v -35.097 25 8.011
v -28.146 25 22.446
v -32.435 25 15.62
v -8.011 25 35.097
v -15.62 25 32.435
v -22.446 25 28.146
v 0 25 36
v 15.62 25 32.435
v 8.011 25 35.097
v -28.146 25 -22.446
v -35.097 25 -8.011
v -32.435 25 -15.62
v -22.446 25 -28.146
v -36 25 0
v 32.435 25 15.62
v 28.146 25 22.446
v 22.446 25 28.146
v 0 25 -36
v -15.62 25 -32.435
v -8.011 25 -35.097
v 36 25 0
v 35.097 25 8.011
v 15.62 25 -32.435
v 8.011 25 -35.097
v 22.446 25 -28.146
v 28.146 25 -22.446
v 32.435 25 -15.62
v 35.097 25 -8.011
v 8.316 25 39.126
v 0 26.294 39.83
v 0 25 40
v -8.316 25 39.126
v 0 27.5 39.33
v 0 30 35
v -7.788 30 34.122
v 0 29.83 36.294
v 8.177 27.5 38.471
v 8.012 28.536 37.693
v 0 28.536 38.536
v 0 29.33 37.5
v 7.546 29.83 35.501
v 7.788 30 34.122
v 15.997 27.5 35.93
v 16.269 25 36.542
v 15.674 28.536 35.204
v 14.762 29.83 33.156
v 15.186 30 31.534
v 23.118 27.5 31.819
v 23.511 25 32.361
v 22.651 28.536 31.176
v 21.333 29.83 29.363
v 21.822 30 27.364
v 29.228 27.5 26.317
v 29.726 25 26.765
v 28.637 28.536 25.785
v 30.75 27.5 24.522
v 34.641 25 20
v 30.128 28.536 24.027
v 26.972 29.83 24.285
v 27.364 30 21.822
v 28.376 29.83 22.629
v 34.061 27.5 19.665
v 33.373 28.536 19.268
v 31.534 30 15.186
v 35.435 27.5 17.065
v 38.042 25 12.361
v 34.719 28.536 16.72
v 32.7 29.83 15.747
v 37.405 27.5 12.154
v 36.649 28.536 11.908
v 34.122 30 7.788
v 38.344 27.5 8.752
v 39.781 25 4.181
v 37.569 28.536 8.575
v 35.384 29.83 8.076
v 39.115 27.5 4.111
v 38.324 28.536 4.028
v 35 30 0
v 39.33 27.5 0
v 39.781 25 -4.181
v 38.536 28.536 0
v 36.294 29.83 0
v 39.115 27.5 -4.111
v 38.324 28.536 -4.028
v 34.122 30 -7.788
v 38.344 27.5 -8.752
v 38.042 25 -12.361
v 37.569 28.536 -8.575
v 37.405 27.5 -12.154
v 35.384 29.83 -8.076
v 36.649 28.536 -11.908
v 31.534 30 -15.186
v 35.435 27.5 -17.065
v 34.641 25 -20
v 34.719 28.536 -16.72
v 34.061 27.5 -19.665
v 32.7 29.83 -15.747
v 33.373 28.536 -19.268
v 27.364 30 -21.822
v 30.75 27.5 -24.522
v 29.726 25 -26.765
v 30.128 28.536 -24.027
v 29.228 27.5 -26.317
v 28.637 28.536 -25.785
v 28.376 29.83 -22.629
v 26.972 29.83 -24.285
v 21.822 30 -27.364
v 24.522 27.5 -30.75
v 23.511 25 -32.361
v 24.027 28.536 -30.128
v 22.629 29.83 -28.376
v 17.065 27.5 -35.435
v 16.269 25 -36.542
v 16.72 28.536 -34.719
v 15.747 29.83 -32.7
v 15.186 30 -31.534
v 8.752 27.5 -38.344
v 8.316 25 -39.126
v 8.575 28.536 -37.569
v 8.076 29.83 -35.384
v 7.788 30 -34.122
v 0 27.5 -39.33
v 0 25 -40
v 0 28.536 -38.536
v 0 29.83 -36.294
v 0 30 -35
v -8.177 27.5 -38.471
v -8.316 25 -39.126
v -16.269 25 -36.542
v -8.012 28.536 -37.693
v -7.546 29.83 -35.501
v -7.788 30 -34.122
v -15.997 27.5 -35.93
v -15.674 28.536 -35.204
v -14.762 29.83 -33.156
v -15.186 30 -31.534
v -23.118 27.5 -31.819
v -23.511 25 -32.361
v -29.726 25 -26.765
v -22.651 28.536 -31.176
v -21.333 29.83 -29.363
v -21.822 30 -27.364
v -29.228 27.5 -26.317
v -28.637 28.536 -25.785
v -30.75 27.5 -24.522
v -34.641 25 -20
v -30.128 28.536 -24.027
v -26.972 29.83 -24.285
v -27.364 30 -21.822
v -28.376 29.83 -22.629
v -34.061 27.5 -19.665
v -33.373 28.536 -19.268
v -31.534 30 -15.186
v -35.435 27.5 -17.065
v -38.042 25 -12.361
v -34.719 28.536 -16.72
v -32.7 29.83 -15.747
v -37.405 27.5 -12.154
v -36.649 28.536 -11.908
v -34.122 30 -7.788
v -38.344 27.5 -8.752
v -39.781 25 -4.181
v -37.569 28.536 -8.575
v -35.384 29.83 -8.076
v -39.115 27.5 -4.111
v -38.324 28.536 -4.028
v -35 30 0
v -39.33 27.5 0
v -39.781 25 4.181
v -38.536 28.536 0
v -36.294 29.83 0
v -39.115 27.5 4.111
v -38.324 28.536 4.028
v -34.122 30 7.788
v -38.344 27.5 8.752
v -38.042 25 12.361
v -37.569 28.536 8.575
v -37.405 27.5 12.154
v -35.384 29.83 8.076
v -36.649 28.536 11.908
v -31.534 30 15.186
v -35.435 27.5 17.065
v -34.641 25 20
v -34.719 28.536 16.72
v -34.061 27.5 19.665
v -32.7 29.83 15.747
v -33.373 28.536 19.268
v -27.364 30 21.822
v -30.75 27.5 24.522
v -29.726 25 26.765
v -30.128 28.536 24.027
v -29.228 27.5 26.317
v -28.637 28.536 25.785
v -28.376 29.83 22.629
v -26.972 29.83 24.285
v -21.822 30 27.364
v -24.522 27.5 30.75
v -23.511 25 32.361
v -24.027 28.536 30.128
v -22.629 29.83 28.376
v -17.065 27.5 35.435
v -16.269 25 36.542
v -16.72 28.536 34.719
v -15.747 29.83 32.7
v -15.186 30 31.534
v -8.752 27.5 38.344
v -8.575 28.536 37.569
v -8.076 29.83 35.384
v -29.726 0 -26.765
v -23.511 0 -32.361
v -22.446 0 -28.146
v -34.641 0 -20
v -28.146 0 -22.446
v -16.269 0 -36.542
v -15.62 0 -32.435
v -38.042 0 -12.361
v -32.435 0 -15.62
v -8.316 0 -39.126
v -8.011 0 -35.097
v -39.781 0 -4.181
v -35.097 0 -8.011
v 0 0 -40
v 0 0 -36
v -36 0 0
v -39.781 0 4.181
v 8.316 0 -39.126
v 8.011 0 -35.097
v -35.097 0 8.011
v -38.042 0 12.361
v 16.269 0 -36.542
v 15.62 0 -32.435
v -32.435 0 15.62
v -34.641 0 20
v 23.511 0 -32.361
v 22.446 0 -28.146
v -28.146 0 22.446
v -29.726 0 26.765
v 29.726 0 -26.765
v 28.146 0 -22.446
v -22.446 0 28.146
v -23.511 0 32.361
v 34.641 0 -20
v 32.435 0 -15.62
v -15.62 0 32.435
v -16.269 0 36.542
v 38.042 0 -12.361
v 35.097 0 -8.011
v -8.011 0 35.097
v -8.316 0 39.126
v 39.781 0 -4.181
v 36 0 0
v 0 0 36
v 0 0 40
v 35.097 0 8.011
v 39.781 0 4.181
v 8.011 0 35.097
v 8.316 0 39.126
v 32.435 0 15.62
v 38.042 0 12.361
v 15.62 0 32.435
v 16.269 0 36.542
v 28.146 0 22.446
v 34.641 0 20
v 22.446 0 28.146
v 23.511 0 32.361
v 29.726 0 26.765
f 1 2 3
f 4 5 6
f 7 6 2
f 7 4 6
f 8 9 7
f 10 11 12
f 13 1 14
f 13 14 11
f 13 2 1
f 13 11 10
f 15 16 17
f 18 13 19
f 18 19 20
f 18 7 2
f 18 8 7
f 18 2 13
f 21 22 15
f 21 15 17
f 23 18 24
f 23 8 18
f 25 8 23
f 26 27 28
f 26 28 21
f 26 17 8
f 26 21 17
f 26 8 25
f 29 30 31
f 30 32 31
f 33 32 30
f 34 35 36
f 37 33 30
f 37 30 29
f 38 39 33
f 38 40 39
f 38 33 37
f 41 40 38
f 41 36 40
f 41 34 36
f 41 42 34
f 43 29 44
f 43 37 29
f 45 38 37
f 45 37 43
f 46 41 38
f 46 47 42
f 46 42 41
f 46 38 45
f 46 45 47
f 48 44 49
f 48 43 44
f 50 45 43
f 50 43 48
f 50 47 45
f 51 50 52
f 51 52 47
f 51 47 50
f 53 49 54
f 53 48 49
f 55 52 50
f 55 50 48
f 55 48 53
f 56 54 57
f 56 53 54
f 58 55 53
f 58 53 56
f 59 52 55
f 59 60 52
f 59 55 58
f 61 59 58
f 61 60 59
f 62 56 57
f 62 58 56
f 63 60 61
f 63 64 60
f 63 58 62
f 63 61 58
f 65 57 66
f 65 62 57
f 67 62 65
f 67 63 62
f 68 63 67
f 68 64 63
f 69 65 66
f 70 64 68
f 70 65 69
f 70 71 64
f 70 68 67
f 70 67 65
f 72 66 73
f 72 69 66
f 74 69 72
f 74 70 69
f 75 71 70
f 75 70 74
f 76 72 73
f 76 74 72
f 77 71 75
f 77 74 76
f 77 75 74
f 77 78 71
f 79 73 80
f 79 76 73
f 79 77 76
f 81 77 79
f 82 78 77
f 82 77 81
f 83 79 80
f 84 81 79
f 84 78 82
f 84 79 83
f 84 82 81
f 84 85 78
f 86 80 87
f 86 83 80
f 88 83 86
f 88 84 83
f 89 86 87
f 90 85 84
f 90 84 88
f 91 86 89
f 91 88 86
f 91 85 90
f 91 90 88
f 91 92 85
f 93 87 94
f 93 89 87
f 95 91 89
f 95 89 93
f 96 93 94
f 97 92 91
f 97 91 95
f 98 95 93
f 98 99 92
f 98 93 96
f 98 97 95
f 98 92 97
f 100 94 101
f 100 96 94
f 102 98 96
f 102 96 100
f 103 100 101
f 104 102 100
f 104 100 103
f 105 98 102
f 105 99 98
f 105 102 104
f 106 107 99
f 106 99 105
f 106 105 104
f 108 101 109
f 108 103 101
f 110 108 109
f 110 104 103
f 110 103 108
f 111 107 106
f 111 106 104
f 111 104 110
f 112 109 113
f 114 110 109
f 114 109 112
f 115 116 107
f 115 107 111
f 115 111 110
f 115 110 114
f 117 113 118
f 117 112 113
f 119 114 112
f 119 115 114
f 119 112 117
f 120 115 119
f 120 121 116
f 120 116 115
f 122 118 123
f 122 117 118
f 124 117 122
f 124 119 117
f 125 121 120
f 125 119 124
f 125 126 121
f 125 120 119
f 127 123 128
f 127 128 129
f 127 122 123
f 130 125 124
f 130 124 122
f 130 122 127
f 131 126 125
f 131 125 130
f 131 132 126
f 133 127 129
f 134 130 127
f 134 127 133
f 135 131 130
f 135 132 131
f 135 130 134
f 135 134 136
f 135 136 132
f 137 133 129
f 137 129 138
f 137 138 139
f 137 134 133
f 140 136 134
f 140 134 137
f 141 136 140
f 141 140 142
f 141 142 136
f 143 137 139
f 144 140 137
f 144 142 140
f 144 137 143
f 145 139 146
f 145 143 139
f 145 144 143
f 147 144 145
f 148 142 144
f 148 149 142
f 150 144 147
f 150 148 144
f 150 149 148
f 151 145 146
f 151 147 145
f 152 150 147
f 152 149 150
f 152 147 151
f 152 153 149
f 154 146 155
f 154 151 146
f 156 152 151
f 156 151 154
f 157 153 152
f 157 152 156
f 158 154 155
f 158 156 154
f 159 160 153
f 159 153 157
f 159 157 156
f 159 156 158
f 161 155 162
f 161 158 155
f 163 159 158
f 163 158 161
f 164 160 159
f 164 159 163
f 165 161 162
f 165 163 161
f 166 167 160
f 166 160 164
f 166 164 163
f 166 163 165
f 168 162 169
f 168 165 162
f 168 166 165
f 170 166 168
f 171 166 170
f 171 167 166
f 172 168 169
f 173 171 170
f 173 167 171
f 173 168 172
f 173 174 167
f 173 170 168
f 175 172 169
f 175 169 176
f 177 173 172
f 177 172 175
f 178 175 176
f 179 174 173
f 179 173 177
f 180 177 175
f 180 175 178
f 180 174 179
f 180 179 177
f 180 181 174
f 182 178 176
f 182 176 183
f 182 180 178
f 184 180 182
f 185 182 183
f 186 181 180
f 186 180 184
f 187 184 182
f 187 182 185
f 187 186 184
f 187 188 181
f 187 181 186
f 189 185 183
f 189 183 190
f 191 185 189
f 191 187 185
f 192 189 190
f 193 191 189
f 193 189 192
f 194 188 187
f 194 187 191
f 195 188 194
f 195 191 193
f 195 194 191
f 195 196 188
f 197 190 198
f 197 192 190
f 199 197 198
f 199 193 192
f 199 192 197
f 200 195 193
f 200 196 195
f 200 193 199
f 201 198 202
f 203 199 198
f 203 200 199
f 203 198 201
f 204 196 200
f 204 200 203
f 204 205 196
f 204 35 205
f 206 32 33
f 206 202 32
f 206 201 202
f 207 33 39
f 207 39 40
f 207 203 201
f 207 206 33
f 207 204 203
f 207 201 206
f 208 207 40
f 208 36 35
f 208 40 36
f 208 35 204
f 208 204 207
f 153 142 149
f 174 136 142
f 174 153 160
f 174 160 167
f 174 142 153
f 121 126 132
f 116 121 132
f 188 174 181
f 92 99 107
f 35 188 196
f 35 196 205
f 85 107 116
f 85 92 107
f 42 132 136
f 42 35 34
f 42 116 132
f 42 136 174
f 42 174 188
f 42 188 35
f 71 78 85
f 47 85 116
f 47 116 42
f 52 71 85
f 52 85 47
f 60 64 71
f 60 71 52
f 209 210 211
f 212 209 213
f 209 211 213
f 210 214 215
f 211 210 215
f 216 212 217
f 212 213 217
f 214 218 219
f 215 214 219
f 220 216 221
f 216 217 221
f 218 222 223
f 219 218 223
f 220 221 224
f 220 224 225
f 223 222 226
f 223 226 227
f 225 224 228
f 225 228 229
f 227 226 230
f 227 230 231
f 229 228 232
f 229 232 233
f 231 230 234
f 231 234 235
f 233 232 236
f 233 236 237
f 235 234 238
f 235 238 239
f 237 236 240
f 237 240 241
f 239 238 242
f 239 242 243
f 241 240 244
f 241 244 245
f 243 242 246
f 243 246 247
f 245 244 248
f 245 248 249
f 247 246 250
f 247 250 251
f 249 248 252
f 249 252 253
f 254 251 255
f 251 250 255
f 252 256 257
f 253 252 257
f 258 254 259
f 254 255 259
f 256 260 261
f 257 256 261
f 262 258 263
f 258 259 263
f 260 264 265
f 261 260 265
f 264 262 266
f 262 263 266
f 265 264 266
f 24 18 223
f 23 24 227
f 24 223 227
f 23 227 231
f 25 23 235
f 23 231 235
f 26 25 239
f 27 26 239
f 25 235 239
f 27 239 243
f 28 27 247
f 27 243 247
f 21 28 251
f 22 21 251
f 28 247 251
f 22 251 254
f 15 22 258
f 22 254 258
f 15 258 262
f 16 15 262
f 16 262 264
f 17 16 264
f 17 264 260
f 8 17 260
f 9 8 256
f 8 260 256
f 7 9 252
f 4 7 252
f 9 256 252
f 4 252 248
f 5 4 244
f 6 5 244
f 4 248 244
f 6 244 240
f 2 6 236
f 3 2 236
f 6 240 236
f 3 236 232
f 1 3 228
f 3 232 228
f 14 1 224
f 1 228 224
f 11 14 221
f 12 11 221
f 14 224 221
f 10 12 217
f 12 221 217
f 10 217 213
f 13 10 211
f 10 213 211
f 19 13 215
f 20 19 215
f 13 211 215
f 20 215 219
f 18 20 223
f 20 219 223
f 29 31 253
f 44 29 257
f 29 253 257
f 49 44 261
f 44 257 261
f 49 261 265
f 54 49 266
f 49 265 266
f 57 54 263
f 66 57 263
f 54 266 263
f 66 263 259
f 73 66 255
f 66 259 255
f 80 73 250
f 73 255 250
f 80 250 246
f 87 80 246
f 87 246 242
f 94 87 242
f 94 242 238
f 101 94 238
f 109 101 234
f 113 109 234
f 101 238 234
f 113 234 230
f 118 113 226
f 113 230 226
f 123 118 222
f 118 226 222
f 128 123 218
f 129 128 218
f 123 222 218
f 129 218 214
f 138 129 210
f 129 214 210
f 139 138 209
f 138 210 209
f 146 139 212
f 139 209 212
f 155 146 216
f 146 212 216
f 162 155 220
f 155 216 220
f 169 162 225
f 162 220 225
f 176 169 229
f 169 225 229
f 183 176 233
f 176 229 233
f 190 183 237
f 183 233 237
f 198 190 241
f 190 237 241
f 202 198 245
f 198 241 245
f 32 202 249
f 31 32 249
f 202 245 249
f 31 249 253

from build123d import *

# Parameters (mm, degrees)
SKETCH1_R           = 40
BOSS_EXTRUDE1_DEPTH = 30
FILLET1_R           = 5
SKETCH2_R           = 36
CUT_EXTRUDE1_DEPTH  = 25


with BuildPart() as part:
    # Sketch1 → Boss-Extrude1 (new body)
    with BuildSketch(Plane(origin=(0, 0, 0), x_dir=(1, 0, 0), z_dir=(0, 1, 0))):
        with Locations(Location((0, 0, 0), (0, 0, 270))):
            Circle(SKETCH1_R)
    extrude(amount=BOSS_EXTRUDE1_DEPTH)

    # Fillet1
    fillet1_edges = [part.edges().sort_by_distance(p)[0] for p in [
        (0, 30, -40),
    ]]
    fillet(fillet1_edges, radius=FILLET1_R)

    # Sketch2 → Cut-Extrude1 (cut)
    with BuildSketch(Plane.XZ):
        with Locations(Location((0, 0, 0), (0, 0, 270))):
            Circle(SKETCH2_R)
    extrude(amount=-CUT_EXTRUDE1_DEPTH, mode=Mode.SUBTRACT)


solid = part.part
